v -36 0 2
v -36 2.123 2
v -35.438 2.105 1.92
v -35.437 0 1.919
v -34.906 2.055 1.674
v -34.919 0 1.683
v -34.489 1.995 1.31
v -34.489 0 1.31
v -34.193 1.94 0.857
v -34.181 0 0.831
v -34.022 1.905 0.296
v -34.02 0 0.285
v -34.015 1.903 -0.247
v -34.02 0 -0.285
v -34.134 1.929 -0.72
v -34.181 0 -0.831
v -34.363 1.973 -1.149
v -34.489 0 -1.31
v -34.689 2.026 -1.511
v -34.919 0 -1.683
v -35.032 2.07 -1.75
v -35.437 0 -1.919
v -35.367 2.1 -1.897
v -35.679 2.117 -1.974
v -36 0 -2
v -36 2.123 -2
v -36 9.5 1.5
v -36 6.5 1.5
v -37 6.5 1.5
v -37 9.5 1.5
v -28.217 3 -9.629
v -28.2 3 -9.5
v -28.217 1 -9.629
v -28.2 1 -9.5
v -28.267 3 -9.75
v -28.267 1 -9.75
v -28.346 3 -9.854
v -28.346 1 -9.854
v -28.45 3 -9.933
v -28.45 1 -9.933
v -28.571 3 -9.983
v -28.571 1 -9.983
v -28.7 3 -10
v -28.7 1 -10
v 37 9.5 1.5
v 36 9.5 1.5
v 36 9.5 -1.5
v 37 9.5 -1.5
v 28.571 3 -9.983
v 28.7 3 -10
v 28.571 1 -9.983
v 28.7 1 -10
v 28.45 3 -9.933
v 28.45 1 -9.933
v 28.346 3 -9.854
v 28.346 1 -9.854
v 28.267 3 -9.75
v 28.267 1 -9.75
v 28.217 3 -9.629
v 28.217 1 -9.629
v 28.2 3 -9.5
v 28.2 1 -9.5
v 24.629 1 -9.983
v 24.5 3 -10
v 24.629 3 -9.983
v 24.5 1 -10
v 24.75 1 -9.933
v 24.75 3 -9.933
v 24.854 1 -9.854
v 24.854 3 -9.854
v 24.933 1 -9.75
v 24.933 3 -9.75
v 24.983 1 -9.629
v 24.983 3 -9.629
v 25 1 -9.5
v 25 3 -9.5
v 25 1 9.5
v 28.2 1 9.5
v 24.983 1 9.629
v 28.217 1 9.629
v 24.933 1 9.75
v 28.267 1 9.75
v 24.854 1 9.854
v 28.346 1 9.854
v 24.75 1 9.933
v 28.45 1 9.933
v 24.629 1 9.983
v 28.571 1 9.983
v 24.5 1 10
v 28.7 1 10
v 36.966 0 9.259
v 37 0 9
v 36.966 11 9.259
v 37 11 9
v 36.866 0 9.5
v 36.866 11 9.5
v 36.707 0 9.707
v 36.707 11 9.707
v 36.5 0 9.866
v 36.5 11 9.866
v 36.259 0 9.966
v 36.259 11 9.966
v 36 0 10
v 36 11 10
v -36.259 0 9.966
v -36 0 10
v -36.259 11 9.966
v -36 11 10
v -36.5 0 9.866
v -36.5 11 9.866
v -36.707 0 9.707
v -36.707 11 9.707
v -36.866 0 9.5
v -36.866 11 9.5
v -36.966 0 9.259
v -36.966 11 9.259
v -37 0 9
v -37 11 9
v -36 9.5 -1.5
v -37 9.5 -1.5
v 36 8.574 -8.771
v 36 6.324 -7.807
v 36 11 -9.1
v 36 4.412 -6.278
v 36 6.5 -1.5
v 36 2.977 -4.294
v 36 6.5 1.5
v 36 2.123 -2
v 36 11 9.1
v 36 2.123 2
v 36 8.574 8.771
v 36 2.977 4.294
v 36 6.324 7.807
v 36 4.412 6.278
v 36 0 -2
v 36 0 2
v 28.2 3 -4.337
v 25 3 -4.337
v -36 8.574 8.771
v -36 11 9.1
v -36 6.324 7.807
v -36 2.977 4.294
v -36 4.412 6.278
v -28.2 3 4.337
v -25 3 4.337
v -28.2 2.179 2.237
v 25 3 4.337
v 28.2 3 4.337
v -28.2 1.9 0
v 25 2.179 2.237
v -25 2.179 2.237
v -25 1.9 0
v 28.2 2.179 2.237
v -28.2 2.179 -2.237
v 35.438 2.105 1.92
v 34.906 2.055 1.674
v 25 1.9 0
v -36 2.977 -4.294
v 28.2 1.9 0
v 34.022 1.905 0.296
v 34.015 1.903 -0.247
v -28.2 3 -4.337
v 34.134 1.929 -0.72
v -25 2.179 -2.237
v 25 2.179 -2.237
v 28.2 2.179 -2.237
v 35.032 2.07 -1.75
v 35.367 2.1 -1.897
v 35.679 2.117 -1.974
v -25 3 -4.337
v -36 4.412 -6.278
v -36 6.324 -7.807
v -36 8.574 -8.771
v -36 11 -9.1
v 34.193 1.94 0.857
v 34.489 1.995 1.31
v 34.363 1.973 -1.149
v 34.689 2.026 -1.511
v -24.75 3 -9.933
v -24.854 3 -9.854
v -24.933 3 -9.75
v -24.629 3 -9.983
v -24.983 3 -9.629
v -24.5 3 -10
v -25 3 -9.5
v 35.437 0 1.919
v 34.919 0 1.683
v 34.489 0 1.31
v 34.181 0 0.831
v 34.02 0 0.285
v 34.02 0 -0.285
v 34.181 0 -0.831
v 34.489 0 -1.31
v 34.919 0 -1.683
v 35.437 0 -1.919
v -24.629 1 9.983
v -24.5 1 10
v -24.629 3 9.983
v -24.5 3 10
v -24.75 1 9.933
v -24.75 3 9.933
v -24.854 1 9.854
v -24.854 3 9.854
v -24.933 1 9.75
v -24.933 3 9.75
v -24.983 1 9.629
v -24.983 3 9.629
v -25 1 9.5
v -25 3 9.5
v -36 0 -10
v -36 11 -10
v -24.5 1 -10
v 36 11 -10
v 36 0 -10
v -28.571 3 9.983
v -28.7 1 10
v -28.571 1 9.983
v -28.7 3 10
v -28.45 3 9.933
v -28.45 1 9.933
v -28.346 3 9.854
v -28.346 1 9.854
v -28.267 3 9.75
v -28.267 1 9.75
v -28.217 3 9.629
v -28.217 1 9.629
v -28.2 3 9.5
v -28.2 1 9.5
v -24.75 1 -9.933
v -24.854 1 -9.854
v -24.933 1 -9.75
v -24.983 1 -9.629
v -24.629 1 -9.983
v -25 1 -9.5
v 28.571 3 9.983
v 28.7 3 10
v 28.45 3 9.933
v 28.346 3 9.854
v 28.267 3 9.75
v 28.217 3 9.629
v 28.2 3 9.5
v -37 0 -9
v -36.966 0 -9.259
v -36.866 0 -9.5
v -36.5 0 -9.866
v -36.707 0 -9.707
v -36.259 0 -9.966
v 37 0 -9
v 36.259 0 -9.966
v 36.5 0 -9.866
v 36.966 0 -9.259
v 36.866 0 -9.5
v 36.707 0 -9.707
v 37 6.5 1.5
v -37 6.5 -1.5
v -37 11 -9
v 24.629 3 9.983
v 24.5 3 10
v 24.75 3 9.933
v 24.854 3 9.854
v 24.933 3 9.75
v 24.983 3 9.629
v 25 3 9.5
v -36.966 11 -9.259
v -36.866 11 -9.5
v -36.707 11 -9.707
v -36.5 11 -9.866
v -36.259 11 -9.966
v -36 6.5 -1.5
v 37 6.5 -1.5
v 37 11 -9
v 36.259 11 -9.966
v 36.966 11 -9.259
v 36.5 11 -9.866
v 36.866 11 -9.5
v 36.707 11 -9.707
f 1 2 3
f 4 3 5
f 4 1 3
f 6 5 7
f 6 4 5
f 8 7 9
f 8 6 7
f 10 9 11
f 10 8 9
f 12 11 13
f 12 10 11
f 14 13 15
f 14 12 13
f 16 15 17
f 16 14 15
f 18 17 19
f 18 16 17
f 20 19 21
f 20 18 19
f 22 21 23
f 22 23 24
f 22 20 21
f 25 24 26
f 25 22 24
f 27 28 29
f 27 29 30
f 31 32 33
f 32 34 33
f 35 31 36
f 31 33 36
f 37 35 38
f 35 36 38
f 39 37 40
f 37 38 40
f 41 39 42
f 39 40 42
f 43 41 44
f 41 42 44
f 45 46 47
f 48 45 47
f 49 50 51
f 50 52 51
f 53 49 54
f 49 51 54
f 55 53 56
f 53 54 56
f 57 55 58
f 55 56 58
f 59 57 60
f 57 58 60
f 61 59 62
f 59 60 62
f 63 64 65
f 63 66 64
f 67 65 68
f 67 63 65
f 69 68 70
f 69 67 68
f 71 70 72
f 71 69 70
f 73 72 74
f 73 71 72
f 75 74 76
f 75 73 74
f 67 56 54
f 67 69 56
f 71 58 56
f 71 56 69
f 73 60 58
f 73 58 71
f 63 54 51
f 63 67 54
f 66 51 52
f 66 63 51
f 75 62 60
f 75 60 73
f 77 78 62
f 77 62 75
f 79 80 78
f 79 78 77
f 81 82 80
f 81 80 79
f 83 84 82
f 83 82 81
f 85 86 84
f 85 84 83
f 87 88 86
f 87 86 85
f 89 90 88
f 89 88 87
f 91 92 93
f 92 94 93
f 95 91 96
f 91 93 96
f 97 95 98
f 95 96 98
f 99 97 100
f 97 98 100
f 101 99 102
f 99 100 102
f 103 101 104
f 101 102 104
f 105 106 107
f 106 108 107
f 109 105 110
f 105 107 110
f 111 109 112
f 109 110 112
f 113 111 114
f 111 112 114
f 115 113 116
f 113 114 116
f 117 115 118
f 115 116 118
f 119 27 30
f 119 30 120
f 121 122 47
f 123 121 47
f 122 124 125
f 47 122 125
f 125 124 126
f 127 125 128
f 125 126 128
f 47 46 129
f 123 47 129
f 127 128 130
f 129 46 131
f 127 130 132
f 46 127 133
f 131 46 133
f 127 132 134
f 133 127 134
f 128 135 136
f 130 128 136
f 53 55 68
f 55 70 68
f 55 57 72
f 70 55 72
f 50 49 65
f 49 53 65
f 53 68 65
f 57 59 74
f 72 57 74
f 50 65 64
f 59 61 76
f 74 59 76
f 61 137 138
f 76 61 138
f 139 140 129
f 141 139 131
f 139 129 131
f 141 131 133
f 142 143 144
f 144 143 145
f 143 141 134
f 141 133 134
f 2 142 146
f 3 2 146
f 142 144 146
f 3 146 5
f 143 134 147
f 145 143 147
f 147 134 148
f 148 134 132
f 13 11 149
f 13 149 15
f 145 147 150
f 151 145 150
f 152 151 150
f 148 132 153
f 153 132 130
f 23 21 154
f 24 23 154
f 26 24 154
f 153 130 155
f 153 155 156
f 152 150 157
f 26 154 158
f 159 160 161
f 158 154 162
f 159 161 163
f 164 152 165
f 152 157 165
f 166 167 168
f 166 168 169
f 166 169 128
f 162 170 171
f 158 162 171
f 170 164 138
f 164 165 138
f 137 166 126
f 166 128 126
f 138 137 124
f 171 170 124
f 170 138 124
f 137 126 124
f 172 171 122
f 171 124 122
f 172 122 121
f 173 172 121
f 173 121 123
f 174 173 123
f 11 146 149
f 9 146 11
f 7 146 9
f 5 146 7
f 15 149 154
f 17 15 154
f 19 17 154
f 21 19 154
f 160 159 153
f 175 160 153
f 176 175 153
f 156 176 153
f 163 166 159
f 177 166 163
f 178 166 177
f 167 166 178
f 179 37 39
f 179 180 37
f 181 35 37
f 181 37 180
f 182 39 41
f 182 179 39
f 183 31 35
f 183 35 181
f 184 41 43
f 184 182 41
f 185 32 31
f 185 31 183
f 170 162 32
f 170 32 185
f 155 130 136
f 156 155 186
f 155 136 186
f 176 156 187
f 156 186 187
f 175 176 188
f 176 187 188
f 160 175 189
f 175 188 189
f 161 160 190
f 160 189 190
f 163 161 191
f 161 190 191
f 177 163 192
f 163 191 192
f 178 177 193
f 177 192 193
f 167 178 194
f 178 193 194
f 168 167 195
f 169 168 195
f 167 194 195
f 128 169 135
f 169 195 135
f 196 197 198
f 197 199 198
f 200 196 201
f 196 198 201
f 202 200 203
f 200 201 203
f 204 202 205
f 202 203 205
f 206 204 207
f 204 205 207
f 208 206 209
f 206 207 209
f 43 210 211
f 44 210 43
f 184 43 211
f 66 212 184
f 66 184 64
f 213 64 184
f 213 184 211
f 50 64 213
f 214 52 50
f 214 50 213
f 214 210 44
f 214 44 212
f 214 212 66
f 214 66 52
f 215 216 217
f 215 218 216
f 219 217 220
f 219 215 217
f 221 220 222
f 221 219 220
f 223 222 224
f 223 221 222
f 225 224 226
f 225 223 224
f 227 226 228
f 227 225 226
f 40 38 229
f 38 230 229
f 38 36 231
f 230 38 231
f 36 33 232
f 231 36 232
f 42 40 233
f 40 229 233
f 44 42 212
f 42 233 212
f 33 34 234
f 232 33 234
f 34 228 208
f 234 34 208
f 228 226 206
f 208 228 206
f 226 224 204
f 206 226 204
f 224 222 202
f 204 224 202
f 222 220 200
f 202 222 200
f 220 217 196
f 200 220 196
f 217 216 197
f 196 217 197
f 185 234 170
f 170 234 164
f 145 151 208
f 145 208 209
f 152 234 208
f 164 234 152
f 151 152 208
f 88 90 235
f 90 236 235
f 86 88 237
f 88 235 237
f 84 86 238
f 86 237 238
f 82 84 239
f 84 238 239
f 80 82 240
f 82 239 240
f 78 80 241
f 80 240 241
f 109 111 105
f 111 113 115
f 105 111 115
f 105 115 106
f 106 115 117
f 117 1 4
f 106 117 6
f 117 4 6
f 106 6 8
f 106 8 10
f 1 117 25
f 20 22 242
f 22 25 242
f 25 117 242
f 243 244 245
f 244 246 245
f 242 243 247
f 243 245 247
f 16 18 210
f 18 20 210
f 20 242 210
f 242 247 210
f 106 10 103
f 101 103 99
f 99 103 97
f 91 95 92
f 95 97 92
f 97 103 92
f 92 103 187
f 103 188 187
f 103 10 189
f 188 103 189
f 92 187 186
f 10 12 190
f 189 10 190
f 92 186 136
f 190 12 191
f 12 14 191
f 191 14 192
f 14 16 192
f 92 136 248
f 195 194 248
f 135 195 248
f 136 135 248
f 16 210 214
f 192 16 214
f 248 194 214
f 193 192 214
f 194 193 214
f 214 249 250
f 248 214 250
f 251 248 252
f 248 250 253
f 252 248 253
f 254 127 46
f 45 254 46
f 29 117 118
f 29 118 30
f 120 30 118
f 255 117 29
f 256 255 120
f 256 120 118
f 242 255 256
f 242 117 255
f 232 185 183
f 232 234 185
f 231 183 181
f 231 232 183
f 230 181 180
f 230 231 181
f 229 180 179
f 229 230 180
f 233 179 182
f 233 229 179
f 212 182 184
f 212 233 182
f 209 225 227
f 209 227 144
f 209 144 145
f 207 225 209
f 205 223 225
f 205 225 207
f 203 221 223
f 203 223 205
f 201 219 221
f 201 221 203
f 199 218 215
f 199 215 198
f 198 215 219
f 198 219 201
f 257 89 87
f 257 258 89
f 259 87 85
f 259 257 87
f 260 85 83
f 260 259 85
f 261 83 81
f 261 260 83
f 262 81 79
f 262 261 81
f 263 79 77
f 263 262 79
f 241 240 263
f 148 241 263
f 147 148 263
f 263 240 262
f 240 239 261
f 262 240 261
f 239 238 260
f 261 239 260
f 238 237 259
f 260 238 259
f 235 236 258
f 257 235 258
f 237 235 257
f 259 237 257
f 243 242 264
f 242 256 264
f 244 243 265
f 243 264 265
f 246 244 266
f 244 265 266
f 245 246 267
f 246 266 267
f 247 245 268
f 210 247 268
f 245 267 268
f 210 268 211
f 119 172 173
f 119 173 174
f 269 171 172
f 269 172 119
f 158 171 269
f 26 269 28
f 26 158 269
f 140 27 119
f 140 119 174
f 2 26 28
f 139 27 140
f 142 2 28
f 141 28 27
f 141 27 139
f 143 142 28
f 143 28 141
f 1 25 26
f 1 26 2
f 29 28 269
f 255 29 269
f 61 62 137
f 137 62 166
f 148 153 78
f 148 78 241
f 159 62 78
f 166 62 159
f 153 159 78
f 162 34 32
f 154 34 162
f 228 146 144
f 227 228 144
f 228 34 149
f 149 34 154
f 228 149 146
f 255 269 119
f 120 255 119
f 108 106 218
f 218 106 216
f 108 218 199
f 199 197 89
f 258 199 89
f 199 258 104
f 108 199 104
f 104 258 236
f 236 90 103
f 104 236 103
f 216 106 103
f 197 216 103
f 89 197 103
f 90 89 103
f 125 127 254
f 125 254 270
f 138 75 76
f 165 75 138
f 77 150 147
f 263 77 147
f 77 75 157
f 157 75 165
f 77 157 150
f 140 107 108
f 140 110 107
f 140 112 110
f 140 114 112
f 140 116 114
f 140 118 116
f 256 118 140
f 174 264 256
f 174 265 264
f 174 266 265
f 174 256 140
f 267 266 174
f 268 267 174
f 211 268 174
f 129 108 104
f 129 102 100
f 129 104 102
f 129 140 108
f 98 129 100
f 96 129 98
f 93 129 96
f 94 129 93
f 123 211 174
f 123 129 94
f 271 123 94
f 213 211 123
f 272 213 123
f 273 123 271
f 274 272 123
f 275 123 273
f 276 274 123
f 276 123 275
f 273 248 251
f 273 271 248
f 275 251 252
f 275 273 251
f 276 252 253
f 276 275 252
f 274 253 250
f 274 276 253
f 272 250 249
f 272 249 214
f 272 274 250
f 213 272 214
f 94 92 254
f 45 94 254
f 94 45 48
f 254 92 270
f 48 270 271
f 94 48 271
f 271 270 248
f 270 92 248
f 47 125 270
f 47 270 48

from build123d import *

# Parameters (mm, degrees)
ESBO_O1_W                = 74
ESBO_O1_H                = 20
RESSALTO_EXTRUS_O1_DEPTH = 11
ESBO_O4_W                = 72
ESBO_O4_H                = 9.1
ESBO_O5_W                = 3
ESBO_O5_H                = 3
CORTE_EXTRUS_O2_DEPTH    = 2.5
CORTE_EXTRUS_O3_DEPTH    = 40.874804075
FILETE1_R                = 1
FILETE2_R                = 1
FILETE3_R                = 1
FILETE4_R                = 1
ESBO_O8_W                = 3.2
ESBO_O8_H                = 2
CORTE_EXTRUS_O5_DEPTH    = 44.474130264
FILETE5_R                = 0.5
FILETE6_R                = 0.5
FILETE7_R                = 0.5
FILETE8_R                = 0.5
FILETE5_OF_ESPELHAR3_R   = 0.5
FILETE6_OF_ESPELHAR3_R   = 0.5
FILETE7_OF_ESPELHAR3_R   = 0.5
FILETE8_OF_ESPELHAR3_R   = 0.5


with BuildPart() as part:
    # Esboço1 → Ressalto-extrusão1 (new body)
    with BuildSketch(Plane(origin=(0, 0, 0), x_dir=(1, 0, 0), z_dir=(0, 1, 0))):
        Rectangle(ESBO_O1_W, ESBO_O1_H)
    extrude(amount=RESSALTO_EXTRUS_O1_DEPTH)

    # Esboço4 → Corte-Revolução2 (revolve, cut)
    with BuildSketch(Plane(origin=(0, 11, 0), x_dir=(1, 0, 0), z_dir=(0, 1, 0))):
        with Locations((0, -4.55)):
            Rectangle(ESBO_O4_W, ESBO_O4_H)
    revolve(axis=Axis((-38.336087416, 11, 0), (1, 0, 0)), mode=Mode.SUBTRACT)

    # Esboço5 → Corte-extrusão2 (cut)
    with BuildSketch(Plane(origin=(-36, 0, 0), x_dir=(0, 0, -1), z_dir=(1, 0, 0))):
        with Locations((0, 8)):
            Rectangle(ESBO_O5_W, ESBO_O5_H)
    corte_extrus_o2 = extrude(amount=-CORTE_EXTRUS_O2_DEPTH, mode=Mode.SUBTRACT)

    # Espelhar1: Corte-extrusão2 across plane
    add(corte_extrus_o2.mirror(Plane(origin=(0, 0, 0), x_dir=(0, 0, 1), z_dir=(1, 0, 0))), mode=Mode.SUBTRACT)

    # Esboço6 → Corte-extrusão3 (cut, through all)
    with BuildSketch(Plane(origin=(0, 0, 0), x_dir=(1, 0, 0), z_dir=(0, 1, 0))):
        with BuildLine():
            Line((-36, 2), (-36, -2))
            ThreePointArc((-36, -2), (-34, 0), (-36, 2))
        make_face()
    corte_extrus_o3 = extrude(amount=CORTE_EXTRUS_O3_DEPTH, mode=Mode.SUBTRACT)

    # Filete1
    filete1_edges = [part.edges().sort_by_distance(p)[0] for p in [
        (37, 5.5, 10),
    ]]
    fillet(filete1_edges, radius=FILETE1_R)

    # Filete2
    filete2_edges = [part.edges().sort_by_distance(p)[0] for p in [
        (37, 5.5, -10),
    ]]
    fillet(filete2_edges, radius=FILETE2_R)

    # Filete3
    filete3_edges = [part.edges().sort_by_distance(p)[0] for p in [
        (-37, 5.5, 10),
    ]]
    fillet(filete3_edges, radius=FILETE3_R)

    # Filete4
    filete4_edges = [part.edges().sort_by_distance(p)[0] for p in [
        (-37, 5.5, -10),
    ]]
    fillet(filete4_edges, radius=FILETE4_R)

    # Espelhar2: Corte-extrusão3 across plane
    add(corte_extrus_o3.mirror(Plane(origin=(0, 0, 0), x_dir=(0, 0, 1), z_dir=(1, 0, 0))), mode=Mode.SUBTRACT)

    # Esboço8 → Corte-extrusão5 (cut, through all)
    with BuildSketch(Plane.XY.offset(10)):
        with Locations((-26.6, 2)):
            Rectangle(ESBO_O8_W, ESBO_O8_H)
    corte_extrus_o5 = extrude(amount=-CORTE_EXTRUS_O5_DEPTH, mode=Mode.SUBTRACT)

    # Filete5
    filete5_edges = [part.edges().sort_by_distance(p)[0] for p in [
        (-28.2, 2, 10),
    ]]
    fillet(filete5_edges, radius=FILETE5_R)

    # Filete6
    filete6_edges = [part.edges().sort_by_distance(p)[0] for p in [
        (-25, 2, 10),
    ]]
    fillet(filete6_edges, radius=FILETE6_R)

    # Filete7
    filete7_edges = [part.edges().sort_by_distance(p)[0] for p in [
        (-25, 2, -10),
    ]]
    fillet(filete7_edges, radius=FILETE7_R)

    # Filete8
    filete8_edges = [part.edges().sort_by_distance(p)[0] for p in [
        (-28.2, 2, -10),
    ]]
    fillet(filete8_edges, radius=FILETE8_R)

    # Espelhar3: Corte-extrusão5 across plane
    add(corte_extrus_o5.mirror(Plane(origin=(0, 0, 0), x_dir=(0, 0, 1), z_dir=(1, 0, 0))), mode=Mode.SUBTRACT)

    # Filete5 of Espelhar3
    filete5_of_espelhar3_edges = [part.edges().sort_by_distance(p)[0] for p in [
        (28.2, 2, 10),
    ]]
    fillet(filete5_of_espelhar3_edges, radius=FILETE5_OF_ESPELHAR3_R)

    # Filete6 of Espelhar3
    filete6_of_espelhar3_edges = [part.edges().sort_by_distance(p)[0] for p in [
        (25, 2, 10),
    ]]
    fillet(filete6_of_espelhar3_edges, radius=FILETE6_OF_ESPELHAR3_R)

    # Filete7 of Espelhar3
    filete7_of_espelhar3_edges = [part.edges().sort_by_distance(p)[0] for p in [
        (25, 2, -10),
    ]]
    fillet(filete7_of_espelhar3_edges, radius=FILETE7_OF_ESPELHAR3_R)

    # Filete8 of Espelhar3
    filete8_of_espelhar3_edges = [part.edges().sort_by_distance(p)[0] for p in [
        (28.2, 2, -10),
    ]]
    fillet(filete8_of_espelhar3_edges, radius=FILETE8_OF_ESPELHAR3_R)


solid = part.part
